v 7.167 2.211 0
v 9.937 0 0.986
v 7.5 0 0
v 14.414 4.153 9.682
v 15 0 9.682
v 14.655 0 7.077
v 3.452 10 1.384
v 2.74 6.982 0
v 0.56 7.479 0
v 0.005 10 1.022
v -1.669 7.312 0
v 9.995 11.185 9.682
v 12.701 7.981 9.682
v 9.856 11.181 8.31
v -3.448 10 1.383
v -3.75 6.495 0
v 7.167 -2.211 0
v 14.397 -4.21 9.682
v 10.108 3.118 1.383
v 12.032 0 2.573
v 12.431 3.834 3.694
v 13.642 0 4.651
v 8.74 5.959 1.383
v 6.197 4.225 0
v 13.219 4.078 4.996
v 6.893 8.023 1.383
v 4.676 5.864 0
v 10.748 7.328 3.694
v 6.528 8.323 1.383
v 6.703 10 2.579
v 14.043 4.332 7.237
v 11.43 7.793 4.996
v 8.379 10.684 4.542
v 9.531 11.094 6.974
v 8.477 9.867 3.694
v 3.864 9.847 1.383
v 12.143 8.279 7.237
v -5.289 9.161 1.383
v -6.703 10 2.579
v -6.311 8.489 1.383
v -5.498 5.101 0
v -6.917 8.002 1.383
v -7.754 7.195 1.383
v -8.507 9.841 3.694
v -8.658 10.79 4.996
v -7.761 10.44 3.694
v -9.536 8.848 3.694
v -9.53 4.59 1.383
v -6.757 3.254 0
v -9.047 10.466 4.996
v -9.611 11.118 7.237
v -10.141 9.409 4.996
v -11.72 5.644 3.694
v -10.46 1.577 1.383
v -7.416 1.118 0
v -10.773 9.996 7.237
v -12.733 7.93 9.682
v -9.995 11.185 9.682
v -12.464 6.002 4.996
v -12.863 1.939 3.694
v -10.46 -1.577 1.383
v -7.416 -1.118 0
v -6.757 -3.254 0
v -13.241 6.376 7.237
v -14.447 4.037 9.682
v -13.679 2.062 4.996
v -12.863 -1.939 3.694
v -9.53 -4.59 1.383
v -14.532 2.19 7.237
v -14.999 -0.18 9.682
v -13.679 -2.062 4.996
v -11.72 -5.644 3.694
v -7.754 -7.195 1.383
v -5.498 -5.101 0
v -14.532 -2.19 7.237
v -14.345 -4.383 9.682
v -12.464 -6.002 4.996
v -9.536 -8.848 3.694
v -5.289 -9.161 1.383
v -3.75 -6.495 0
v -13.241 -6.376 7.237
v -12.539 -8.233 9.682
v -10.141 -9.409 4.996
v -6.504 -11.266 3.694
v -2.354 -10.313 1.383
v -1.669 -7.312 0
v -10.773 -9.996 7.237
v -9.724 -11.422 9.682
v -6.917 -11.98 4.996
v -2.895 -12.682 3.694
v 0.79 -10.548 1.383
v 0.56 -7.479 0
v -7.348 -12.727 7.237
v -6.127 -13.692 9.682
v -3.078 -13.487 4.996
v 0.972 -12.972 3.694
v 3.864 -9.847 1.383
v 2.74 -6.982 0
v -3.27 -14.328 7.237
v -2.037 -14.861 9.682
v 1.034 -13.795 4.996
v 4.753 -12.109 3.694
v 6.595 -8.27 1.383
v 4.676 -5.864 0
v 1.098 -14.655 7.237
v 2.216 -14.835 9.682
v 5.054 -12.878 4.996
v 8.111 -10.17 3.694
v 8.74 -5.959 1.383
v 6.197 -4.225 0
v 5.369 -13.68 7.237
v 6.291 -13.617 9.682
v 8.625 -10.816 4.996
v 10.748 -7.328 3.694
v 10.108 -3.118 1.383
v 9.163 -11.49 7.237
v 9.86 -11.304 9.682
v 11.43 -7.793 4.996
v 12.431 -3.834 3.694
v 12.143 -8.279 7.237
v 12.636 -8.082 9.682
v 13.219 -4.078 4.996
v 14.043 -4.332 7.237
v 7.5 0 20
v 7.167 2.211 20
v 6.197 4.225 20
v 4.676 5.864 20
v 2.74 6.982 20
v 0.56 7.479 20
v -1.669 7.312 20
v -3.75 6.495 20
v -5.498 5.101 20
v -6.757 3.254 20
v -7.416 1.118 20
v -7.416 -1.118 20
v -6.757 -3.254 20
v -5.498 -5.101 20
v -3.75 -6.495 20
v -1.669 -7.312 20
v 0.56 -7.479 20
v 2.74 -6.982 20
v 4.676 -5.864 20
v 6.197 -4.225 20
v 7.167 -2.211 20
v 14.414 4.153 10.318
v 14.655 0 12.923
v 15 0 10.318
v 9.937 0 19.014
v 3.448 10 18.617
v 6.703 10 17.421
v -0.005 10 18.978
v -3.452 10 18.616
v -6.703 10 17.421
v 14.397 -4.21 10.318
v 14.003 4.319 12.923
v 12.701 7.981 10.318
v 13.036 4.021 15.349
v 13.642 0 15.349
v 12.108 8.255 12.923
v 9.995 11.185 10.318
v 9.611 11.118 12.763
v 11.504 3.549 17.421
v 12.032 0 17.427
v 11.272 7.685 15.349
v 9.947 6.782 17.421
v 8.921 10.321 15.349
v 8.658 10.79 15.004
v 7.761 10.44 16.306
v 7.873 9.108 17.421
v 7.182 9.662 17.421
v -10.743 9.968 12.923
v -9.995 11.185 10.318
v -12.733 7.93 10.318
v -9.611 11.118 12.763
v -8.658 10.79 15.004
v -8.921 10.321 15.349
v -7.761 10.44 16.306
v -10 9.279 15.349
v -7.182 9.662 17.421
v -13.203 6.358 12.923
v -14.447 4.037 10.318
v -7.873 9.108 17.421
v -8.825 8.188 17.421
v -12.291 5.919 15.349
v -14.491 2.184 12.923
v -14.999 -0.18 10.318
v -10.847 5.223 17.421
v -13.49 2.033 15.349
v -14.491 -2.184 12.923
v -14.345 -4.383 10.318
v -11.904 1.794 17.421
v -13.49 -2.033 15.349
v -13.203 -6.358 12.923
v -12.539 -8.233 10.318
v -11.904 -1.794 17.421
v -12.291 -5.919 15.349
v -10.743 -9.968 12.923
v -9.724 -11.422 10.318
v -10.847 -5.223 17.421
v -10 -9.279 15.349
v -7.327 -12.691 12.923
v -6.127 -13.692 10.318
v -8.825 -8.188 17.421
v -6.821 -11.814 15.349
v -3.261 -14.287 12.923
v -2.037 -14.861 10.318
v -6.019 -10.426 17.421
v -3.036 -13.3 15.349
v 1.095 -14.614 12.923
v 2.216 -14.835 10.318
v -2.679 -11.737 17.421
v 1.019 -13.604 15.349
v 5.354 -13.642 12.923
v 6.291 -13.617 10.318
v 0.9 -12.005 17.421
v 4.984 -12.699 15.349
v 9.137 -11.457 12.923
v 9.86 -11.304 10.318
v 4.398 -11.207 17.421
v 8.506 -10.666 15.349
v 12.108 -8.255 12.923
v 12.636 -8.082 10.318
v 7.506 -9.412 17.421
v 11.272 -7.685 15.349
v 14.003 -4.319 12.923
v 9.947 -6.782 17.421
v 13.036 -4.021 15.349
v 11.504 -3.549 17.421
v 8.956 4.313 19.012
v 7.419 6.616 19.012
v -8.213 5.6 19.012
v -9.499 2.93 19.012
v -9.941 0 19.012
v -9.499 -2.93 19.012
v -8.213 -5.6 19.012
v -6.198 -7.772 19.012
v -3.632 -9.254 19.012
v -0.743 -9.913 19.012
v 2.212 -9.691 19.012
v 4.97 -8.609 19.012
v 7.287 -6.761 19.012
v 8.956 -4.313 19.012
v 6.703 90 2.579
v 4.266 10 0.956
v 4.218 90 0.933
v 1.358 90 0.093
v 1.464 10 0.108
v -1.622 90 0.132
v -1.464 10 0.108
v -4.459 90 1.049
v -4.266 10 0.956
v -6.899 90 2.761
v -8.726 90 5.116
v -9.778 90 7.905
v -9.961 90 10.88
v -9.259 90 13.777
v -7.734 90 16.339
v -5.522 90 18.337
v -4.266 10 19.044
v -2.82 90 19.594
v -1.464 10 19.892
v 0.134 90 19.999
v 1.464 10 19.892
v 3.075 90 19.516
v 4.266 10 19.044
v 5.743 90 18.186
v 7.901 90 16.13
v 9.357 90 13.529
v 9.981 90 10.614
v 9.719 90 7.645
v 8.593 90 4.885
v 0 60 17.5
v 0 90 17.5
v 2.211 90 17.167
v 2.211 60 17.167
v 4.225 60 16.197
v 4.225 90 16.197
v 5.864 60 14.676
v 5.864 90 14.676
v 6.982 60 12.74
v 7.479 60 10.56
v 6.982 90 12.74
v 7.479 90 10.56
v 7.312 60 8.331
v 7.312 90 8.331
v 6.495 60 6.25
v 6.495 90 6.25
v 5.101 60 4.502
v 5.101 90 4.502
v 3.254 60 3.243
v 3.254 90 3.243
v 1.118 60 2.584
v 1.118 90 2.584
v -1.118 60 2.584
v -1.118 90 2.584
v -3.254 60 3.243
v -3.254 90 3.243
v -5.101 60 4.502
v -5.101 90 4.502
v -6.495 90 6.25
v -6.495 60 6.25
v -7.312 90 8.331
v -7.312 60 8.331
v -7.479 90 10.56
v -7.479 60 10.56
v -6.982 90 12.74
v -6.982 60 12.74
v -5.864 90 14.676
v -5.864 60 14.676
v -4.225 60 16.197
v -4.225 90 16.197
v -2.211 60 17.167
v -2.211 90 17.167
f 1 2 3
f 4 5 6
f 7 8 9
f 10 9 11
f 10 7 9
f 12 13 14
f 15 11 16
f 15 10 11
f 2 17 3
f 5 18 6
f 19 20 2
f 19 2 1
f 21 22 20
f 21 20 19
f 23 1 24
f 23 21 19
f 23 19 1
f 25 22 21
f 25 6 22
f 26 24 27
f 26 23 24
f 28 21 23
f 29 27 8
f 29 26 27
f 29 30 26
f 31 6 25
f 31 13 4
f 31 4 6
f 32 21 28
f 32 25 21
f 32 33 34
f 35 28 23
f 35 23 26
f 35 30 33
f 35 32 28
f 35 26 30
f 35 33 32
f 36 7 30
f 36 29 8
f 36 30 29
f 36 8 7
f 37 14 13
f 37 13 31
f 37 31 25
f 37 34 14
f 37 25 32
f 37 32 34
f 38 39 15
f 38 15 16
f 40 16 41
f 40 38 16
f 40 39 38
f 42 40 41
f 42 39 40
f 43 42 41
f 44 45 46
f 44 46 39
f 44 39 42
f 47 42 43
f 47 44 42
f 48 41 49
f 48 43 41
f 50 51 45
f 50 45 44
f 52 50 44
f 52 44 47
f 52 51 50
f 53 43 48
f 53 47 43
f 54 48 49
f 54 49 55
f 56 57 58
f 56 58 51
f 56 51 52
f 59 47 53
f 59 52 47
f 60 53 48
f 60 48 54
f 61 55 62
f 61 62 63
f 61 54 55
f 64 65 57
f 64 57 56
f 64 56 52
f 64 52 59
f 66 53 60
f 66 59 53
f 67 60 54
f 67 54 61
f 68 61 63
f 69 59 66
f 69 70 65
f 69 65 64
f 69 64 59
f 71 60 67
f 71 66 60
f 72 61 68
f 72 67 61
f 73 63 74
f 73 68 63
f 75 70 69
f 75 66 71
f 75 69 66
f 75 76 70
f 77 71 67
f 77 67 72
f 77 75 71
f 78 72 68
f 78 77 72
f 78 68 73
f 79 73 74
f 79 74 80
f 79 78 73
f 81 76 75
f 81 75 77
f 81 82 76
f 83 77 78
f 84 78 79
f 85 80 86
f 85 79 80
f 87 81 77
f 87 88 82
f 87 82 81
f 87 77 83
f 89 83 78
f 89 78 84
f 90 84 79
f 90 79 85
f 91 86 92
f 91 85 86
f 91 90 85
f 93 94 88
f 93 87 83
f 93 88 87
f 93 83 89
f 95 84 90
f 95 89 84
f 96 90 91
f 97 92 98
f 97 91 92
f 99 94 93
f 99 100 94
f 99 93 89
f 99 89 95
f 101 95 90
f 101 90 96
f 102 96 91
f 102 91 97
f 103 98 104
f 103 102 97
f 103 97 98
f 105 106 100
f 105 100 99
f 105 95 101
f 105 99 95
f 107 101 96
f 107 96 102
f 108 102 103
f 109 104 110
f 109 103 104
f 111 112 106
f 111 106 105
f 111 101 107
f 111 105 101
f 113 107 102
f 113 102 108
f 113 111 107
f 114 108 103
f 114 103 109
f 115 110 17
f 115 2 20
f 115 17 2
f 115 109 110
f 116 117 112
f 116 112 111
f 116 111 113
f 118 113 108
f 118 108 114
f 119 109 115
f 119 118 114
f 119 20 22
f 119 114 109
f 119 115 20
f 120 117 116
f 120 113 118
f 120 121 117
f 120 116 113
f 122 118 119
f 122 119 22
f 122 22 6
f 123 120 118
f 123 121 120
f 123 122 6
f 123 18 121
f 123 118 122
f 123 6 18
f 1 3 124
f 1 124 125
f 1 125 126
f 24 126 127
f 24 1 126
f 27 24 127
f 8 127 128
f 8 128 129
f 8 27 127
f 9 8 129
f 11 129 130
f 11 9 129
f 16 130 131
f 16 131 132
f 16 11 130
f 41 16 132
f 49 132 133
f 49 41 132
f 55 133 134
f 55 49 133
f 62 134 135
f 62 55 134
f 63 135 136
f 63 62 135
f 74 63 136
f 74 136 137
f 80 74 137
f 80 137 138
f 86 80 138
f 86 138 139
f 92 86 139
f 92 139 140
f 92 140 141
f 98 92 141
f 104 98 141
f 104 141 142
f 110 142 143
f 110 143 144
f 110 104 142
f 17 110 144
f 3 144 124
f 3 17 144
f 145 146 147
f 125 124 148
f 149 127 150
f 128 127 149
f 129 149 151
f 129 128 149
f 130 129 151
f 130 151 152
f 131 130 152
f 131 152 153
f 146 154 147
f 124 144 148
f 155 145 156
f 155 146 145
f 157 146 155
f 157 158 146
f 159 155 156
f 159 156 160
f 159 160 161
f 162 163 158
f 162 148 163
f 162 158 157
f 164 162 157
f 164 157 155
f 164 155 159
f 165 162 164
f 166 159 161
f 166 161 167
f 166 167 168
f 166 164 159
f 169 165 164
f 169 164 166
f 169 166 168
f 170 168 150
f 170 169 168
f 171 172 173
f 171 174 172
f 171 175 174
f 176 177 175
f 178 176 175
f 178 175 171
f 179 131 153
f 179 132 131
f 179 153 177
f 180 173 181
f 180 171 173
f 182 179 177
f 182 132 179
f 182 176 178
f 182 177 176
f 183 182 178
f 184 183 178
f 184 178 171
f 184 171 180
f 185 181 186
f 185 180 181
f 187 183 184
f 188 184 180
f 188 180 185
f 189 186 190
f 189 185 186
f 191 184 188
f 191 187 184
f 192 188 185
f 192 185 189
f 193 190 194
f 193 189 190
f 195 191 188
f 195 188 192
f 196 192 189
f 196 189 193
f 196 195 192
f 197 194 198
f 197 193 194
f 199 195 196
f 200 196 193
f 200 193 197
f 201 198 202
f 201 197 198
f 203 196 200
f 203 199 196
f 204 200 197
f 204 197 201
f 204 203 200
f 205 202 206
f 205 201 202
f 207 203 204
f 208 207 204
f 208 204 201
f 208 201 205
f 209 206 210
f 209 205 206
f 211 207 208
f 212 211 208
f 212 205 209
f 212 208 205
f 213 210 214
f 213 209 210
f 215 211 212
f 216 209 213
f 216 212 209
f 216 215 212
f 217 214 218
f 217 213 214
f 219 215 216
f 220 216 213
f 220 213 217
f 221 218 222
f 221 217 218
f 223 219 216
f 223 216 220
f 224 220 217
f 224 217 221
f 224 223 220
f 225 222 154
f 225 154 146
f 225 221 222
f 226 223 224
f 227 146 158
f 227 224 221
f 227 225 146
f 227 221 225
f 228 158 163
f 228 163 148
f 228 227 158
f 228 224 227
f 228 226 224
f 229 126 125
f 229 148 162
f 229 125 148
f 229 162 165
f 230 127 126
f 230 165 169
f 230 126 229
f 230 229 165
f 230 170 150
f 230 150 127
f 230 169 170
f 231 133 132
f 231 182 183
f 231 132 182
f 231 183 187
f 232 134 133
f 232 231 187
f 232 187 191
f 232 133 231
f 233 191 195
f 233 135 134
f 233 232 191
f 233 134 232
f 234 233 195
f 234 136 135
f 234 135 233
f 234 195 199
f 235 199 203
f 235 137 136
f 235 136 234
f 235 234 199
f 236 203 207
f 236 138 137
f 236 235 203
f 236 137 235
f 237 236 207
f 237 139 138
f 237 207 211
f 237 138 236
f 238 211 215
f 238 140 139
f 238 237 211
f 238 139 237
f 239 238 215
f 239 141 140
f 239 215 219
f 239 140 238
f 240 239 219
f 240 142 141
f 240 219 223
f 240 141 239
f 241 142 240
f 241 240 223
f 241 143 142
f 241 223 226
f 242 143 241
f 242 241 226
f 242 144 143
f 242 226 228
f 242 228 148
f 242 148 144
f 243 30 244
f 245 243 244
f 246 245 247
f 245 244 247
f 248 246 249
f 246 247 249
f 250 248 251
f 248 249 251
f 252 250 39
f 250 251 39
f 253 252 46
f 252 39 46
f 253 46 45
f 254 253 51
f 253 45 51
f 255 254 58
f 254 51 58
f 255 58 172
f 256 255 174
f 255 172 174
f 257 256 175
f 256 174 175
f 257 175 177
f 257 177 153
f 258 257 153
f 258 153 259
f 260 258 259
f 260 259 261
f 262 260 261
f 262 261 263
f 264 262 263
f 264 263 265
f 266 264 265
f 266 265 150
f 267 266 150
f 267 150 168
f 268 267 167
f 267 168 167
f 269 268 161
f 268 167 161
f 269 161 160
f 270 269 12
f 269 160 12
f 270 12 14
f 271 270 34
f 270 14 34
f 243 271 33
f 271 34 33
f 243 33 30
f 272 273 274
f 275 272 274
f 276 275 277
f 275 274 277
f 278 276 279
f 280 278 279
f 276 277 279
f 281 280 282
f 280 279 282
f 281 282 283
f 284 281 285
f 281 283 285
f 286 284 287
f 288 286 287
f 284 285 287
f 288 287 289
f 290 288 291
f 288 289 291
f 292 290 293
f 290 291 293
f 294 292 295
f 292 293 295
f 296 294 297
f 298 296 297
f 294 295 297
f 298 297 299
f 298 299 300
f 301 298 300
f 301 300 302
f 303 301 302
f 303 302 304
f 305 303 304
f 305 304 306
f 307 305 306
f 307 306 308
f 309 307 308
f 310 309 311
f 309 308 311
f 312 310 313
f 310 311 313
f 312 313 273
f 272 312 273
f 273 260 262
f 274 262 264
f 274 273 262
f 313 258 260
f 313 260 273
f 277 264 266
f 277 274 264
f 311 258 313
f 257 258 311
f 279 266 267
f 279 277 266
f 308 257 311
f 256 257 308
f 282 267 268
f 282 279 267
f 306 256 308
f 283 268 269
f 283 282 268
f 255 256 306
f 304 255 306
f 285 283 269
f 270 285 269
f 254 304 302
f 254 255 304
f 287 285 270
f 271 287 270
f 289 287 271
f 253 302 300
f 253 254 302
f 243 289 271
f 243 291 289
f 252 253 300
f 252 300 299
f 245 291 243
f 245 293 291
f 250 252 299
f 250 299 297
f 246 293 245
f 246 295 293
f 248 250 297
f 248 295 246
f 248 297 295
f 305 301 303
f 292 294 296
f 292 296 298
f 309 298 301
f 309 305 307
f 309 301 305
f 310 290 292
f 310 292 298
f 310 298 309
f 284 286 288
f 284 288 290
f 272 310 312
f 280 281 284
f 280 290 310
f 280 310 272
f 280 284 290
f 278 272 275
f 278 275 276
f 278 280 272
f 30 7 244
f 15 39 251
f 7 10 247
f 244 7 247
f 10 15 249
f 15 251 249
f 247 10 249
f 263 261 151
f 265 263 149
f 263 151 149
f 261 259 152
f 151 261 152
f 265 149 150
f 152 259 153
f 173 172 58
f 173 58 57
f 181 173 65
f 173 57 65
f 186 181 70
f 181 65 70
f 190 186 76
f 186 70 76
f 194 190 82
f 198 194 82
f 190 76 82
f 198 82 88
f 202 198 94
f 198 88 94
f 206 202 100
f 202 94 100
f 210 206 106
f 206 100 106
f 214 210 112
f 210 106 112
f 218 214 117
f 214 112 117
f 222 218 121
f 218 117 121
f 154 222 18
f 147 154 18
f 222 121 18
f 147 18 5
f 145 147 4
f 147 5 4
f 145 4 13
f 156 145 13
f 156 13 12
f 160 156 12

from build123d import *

# Parameters (mm, degrees)
SKETCH1_R           = 15
SKETCH1_R_2         = 7.5
BOSS_EXTRUDE1_DEPTH = 20
FILLET1_R           = 10
BOSS_EXTRUDE3_START = 10
SKETCH2_R           = 10
BOSS_EXTRUDE3_DEPTH = 80
SKETCH5_R           = 7.5
CUT_EXTRUDE3_DEPTH  = 30


with BuildPart() as part:
    # Sketch1 → Boss-Extrude1 (new body)
    with BuildSketch(Plane.XY):
        Circle(SKETCH1_R)
        Circle(SKETCH1_R_2, mode=Mode.SUBTRACT)
    extrude(amount=BOSS_EXTRUDE1_DEPTH)

    # Fillet1
    # the kernel refuses this fillet: 10 mm, written as the material it takes off along each edge
    with BuildSketch(Plane(origin=(0, 0, 0), x_dir=(1, 0, 0), z_dir=(0, -1, 0))) as fillet1_piece_1:
        with BuildLine():
            CenterArc((5, 9.682458366), FILLET1_R, 284.477512186, 75.522487814)
            Line((7.5, 0), (7.55, -0.193649167))
            ThreePointArc((7.55, -0.193649167), (11.25, -0.2), (15, -0.2))
            Line((15, -0.2), (15.2, 0))
            Line((15.2, 0), (15.2, 9.682458366))
            Line((15.2, 9.682458366), (15, 9.682458366))
        make_face()
    revolve(axis=Axis((0, 0, 0), (0, 0, 1)), mode=Mode.SUBTRACT)
    with BuildSketch(Plane(origin=(0, 0, 20), x_dir=(1, 0, 0), z_dir=(0, -1, 0))) as fillet1_piece_2:
        with BuildLine():
            CenterArc((5, -9.682458366), FILLET1_R, 0, 75.522487814)
            Line((7.5, 0), (7.55, 0.193649167))
            ThreePointArc((7.55, 0.193649167), (11.25, 0.2), (15, 0.2))
            Line((15, 0.2), (15.2, 0))
            Line((15.2, 0), (15.2, -9.682458366))
            Line((15.2, -9.682458366), (15, -9.682458366))
        make_face()
    revolve(axis=Axis((0, 0, 20), (0, 0, 1)), mode=Mode.SUBTRACT)

    # Sketch2 → Boss-Extrude3 (add)
    with BuildSketch(Plane(origin=(0, 0, 0), x_dir=(1, 0, 0), z_dir=(0, 1, 0)).offset(BOSS_EXTRUDE3_START)):
        with Locations(Location((0, -10, 0), (0, 0, 47.908263914))):
            Circle(SKETCH2_R)
    extrude(amount=BOSS_EXTRUDE3_DEPTH)

    # Sketch5 → Cut-Extrude3 (cut)
    with BuildSketch(Plane(origin=(0, 90, 0), x_dir=(1, 0, 0), z_dir=(0, 1, 0))):
        with Locations(Location((0, -10, 0), (0, 0, 270))):
            Circle(SKETCH5_R)
    extrude(amount=-CUT_EXTRUDE3_DEPTH, mode=Mode.SUBTRACT)


solid = part.part
